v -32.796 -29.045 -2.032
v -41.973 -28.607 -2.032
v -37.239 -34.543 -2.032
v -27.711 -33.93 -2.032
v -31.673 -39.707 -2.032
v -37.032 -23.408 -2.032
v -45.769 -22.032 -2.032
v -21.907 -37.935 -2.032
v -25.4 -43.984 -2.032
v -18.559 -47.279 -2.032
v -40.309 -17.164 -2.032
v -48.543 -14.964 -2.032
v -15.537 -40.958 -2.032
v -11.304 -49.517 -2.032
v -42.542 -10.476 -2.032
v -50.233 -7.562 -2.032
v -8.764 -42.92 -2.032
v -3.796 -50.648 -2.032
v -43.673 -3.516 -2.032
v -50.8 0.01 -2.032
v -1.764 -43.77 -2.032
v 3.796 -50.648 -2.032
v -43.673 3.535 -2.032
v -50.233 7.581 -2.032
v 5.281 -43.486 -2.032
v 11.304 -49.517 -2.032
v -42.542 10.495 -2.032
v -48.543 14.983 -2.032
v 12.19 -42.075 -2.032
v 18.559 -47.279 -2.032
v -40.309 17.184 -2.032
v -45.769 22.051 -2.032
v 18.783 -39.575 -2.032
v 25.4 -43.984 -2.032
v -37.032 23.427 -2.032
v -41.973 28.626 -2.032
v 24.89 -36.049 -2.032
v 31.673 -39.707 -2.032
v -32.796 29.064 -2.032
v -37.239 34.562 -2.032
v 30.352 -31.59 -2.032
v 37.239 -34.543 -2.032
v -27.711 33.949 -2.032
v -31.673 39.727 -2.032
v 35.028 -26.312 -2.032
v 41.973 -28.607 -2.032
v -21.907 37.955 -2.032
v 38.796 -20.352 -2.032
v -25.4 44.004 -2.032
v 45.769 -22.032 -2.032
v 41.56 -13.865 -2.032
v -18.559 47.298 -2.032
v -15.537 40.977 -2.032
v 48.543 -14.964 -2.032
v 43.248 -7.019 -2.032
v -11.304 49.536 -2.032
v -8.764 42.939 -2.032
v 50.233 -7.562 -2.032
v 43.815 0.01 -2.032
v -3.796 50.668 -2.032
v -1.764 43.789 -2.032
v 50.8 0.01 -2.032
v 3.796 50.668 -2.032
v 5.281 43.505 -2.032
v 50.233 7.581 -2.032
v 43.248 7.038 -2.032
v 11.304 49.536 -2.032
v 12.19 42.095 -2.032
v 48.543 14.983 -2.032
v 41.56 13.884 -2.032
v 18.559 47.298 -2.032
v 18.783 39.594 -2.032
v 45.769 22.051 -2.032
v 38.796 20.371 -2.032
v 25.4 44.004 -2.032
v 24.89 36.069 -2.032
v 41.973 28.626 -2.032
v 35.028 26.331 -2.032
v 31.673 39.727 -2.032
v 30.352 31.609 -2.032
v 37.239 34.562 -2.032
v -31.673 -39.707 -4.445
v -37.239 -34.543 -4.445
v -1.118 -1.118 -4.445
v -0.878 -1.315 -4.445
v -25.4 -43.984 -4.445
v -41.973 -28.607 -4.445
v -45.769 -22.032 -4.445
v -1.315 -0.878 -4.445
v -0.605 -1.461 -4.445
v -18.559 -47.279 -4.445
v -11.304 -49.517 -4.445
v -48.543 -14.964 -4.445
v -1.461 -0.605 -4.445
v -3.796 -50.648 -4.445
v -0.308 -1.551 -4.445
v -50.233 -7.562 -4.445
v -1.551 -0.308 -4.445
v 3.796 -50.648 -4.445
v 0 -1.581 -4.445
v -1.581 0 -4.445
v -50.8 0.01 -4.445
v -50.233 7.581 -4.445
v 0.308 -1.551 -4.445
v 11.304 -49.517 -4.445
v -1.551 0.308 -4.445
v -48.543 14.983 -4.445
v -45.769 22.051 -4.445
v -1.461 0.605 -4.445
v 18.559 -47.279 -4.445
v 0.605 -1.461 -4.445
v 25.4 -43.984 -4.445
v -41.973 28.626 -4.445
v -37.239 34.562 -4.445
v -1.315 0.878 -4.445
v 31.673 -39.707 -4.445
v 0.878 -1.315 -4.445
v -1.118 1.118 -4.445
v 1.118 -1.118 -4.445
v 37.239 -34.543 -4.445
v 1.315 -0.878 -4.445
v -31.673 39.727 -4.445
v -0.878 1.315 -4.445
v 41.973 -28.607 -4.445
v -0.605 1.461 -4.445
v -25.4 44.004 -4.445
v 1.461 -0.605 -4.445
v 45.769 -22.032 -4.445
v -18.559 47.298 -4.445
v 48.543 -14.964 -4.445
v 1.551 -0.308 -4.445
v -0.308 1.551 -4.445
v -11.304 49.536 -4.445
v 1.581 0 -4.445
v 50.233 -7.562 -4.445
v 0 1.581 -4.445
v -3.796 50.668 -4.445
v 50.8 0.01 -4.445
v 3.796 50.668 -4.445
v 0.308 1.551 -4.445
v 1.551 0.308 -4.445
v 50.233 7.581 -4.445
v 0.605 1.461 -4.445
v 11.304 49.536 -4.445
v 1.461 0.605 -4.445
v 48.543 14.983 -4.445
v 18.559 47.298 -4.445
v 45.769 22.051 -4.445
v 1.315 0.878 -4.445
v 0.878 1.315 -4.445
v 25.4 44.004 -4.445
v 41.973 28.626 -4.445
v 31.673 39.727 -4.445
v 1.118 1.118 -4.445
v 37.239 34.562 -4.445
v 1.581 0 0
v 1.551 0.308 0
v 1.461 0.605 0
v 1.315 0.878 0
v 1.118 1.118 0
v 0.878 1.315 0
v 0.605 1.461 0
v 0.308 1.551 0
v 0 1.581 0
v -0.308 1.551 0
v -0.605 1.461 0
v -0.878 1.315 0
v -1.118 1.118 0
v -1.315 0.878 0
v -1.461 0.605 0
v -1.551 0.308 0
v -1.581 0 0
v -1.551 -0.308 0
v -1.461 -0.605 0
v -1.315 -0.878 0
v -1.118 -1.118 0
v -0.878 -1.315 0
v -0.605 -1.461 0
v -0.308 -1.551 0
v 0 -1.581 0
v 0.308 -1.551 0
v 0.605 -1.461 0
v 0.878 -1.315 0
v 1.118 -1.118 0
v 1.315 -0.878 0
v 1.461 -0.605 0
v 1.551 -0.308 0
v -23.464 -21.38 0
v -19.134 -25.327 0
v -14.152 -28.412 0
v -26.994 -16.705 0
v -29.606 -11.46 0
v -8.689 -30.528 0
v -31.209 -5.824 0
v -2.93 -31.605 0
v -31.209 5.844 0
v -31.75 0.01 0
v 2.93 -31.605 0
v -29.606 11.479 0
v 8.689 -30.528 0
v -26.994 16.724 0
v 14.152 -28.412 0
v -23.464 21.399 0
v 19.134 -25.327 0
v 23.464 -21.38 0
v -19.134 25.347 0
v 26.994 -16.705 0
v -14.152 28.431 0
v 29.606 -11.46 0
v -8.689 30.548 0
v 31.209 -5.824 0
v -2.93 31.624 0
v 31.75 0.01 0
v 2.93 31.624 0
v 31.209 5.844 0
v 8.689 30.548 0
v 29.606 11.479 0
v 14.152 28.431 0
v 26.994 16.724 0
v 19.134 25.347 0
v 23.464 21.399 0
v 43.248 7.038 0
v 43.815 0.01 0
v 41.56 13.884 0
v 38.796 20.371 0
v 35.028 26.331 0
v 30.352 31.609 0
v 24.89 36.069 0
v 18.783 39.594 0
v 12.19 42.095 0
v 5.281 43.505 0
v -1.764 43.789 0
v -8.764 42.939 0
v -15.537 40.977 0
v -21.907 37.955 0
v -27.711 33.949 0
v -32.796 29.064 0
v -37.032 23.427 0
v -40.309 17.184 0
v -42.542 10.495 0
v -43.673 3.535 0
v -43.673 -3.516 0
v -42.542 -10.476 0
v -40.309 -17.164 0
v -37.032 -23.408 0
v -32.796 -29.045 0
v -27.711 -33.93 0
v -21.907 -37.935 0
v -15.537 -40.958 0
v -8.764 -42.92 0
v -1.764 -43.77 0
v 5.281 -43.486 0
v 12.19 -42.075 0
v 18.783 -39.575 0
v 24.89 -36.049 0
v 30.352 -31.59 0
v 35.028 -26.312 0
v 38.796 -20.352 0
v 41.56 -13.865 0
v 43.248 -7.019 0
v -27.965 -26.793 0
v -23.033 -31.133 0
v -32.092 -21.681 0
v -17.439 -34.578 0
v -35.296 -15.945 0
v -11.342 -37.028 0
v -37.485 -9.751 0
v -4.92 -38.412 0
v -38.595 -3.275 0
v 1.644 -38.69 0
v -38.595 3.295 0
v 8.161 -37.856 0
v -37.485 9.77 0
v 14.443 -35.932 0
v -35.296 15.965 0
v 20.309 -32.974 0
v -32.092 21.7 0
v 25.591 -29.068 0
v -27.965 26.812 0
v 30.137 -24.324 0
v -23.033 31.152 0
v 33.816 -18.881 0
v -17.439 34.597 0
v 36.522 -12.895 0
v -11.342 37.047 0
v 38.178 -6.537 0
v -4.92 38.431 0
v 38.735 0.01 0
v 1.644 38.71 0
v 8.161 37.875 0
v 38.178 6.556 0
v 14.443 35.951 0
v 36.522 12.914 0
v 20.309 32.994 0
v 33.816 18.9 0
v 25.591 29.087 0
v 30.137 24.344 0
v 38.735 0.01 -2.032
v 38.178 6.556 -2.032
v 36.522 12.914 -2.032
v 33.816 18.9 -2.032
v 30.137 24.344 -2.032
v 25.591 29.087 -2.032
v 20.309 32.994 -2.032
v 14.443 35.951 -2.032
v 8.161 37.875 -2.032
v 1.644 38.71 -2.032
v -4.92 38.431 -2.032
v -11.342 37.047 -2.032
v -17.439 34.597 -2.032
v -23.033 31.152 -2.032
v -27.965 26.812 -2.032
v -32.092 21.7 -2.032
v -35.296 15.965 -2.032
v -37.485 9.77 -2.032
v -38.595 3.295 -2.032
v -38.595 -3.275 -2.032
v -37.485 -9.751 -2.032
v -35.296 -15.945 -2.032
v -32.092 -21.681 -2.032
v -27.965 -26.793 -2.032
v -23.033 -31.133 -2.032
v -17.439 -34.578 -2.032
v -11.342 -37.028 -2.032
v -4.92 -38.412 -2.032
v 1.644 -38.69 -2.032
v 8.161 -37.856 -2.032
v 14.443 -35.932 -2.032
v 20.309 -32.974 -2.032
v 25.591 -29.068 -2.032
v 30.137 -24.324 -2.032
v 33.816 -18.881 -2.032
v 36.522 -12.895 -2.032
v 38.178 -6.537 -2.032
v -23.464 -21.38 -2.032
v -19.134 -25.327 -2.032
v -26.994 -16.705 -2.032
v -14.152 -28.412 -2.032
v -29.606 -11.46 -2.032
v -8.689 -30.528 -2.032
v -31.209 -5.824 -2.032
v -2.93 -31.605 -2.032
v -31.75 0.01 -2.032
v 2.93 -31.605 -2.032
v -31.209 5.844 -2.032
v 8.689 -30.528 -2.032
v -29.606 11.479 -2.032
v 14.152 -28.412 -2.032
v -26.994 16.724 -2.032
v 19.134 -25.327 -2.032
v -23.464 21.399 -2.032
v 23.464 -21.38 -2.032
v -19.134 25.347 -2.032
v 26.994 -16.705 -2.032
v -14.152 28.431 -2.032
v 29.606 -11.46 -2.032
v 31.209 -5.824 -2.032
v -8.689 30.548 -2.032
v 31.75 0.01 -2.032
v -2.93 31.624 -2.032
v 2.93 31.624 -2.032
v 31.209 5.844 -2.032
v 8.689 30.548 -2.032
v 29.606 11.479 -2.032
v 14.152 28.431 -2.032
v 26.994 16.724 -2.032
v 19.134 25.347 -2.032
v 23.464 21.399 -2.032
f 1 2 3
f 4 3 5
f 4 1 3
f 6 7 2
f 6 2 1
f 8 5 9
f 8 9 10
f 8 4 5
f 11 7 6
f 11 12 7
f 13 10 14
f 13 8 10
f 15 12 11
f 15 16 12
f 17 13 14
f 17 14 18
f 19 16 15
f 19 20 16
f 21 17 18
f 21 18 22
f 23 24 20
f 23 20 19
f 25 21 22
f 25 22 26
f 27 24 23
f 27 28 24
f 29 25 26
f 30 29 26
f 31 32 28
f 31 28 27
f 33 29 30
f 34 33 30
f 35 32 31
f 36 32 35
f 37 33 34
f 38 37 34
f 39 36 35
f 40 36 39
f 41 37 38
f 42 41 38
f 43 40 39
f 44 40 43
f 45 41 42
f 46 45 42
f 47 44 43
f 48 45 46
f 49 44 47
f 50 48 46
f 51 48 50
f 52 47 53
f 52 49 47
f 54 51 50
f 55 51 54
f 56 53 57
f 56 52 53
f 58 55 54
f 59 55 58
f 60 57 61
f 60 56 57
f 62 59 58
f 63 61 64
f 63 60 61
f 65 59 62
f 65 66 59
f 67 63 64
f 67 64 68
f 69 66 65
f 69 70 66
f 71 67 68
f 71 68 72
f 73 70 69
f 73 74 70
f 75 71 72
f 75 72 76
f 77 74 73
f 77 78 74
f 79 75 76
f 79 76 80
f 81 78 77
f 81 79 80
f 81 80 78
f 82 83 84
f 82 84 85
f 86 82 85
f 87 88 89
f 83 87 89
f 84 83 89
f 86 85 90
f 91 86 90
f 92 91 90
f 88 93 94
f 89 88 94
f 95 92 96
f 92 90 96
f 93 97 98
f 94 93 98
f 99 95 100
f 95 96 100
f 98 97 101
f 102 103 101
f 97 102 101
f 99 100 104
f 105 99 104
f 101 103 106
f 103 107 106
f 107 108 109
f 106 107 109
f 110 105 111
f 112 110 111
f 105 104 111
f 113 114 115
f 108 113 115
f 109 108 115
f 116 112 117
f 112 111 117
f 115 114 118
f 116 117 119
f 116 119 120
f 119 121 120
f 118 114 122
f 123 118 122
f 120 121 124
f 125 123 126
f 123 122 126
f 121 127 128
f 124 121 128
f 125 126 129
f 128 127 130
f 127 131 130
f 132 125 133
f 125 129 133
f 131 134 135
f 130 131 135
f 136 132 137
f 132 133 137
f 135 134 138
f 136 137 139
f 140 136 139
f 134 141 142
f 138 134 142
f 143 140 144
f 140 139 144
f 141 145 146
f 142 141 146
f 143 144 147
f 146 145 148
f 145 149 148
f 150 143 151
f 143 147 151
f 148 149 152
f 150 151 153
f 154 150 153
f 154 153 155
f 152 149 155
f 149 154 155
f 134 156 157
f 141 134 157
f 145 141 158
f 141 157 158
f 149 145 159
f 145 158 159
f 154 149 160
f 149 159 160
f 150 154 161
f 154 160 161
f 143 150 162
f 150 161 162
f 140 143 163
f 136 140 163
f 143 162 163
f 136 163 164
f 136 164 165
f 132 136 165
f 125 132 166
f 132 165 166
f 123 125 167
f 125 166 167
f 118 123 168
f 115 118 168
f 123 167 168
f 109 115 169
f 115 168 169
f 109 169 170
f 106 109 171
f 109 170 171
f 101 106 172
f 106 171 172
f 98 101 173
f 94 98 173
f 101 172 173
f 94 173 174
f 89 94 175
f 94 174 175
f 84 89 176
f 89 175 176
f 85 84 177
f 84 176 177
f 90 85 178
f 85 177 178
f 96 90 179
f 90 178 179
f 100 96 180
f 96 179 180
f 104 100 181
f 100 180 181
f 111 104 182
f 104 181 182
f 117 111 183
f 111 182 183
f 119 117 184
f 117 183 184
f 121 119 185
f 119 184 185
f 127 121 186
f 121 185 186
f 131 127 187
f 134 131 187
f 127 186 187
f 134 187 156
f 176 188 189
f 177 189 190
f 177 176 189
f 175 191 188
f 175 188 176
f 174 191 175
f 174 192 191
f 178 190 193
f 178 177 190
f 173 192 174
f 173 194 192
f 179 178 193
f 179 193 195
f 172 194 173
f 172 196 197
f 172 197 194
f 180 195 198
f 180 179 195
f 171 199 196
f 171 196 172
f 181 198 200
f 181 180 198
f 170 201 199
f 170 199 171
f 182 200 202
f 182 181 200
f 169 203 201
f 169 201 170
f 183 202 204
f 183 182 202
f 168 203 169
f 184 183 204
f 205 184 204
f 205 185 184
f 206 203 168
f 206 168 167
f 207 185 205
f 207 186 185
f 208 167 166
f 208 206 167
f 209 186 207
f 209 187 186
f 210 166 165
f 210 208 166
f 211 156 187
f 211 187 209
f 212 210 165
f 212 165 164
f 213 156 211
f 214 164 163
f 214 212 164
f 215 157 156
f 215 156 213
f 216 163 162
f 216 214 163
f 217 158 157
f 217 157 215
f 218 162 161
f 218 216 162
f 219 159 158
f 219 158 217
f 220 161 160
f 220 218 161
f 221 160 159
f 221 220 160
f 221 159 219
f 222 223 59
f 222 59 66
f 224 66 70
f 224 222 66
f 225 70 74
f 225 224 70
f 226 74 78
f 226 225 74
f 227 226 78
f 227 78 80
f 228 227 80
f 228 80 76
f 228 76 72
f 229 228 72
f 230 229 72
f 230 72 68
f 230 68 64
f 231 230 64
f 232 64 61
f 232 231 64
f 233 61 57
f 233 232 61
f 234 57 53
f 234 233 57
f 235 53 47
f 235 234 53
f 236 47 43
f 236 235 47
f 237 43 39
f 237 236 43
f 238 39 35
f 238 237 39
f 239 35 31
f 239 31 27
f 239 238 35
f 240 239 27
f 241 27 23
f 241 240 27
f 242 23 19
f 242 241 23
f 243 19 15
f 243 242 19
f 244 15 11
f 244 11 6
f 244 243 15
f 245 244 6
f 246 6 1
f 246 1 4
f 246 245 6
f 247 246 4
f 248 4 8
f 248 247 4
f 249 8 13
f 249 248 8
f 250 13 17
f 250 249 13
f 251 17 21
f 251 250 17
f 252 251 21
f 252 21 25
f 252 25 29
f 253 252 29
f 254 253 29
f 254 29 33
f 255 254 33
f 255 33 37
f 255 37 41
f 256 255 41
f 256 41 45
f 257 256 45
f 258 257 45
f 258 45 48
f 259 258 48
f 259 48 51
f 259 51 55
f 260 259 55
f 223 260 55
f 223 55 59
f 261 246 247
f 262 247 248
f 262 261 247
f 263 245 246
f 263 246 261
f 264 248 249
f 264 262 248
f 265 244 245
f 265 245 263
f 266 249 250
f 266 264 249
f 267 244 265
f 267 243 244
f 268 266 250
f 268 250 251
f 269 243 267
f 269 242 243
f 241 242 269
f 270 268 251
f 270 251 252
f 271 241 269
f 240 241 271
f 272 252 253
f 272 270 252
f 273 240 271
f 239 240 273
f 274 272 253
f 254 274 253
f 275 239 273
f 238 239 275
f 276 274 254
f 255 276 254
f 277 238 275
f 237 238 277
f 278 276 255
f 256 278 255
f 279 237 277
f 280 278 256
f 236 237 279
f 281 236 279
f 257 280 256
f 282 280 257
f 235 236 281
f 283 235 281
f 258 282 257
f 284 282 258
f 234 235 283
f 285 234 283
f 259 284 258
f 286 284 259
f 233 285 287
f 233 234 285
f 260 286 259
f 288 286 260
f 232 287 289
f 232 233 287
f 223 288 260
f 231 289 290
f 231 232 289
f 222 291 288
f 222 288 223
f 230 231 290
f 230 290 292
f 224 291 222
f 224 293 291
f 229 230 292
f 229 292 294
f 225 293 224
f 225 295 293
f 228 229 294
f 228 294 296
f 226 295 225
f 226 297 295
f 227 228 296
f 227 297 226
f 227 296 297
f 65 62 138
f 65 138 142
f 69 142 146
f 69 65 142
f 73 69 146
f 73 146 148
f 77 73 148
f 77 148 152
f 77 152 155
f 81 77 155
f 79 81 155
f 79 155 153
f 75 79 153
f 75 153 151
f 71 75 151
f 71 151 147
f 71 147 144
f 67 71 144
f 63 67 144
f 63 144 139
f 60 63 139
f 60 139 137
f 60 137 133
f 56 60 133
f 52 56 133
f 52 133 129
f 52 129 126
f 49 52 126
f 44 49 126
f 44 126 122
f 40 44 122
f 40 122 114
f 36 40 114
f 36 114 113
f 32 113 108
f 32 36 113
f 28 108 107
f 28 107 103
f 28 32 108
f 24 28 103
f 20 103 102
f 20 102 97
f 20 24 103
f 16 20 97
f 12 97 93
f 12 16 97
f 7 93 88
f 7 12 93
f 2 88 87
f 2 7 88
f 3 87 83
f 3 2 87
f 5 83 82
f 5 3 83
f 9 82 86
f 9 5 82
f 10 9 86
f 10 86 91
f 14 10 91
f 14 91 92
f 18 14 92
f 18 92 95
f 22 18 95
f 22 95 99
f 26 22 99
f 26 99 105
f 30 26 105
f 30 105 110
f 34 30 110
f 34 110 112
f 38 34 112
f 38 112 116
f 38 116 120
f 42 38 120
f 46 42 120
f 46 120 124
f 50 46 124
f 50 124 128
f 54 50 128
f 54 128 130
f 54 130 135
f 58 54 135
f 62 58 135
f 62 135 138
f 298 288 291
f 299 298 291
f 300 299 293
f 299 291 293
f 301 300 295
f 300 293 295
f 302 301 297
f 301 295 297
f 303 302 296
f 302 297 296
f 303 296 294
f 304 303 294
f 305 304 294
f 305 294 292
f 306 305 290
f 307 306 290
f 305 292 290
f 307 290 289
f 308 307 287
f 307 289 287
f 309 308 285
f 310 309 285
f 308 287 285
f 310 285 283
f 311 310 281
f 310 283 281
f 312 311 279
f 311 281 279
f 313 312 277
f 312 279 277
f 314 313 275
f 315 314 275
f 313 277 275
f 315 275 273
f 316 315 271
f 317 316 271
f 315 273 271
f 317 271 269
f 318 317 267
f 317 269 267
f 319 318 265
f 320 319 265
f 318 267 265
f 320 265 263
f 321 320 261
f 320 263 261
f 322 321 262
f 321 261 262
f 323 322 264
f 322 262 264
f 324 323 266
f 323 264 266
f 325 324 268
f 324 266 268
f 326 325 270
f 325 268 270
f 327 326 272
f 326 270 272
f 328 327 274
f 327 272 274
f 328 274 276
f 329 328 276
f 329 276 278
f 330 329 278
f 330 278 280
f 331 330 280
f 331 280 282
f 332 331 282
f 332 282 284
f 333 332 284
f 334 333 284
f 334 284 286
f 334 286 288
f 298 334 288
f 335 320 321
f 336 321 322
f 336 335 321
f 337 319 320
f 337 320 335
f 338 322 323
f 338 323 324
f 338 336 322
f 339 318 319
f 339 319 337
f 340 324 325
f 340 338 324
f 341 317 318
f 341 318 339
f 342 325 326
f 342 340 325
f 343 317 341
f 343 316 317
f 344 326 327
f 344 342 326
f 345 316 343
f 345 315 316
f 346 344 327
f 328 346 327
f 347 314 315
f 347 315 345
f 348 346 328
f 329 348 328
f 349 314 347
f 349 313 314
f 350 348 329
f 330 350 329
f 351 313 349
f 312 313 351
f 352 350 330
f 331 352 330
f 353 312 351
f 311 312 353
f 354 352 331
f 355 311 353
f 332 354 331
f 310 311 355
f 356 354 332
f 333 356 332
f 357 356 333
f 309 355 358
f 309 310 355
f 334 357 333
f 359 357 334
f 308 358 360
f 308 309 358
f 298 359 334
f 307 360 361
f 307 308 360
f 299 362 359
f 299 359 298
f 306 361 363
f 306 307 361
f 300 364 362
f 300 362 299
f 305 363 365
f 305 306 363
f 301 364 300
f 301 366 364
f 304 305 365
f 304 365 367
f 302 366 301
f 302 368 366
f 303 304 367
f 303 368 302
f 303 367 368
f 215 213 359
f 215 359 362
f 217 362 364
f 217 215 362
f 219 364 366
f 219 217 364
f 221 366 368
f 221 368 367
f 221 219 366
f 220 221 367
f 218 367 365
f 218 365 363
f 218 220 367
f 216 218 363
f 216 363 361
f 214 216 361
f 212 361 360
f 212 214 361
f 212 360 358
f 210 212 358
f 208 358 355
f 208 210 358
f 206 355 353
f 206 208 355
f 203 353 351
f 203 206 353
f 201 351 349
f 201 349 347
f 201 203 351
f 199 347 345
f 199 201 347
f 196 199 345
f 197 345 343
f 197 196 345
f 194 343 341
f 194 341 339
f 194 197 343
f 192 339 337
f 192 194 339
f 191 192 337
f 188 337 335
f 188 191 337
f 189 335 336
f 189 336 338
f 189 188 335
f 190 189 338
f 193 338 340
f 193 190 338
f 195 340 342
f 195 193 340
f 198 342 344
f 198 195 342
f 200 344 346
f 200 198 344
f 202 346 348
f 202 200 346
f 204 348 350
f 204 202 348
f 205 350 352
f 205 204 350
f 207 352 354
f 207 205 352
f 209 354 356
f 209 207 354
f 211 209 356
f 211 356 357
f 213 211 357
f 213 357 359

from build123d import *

# Parameters (mm, degrees)
F0_R     = 50.8
F0_R_2   = 43.815
F0_R_3   = 38.735
F0_R_4   = 31.75
F0_R_5   = 1.581227411
F1_DEPTH = 4.445
F2_DEPTH = 2.032


with BuildPart() as f1:
    # F0 (on Top) → F1 (new body)
    with BuildSketch(Plane.XY):
        with Locations((1.2696e-06, 0.0096165841)):
            Circle(F0_R)
        with Locations((1.2696e-06, 0.0096165841)):
            Circle(F0_R_2, mode=Mode.SUBTRACT)
        with Locations((1.2696e-06, 0.0096165841)):
            Circle(F0_R_2)
        with Locations((1.2696e-06, 0.0096165841)):
            Circle(F0_R_3, mode=Mode.SUBTRACT)
        with Locations((1.2696e-06, 0.0096165841)):
            Circle(F0_R_3)
        with Locations((1.2696e-06, 0.0096165841)):
            Circle(F0_R_4, mode=Mode.SUBTRACT)
        with Locations((1.2696e-06, 0.0096165841)):
            Circle(F0_R_4)
        Circle(F0_R_5, mode=Mode.SUBTRACT)
    extrude(amount=-F1_DEPTH)

    # F0 (on Top) → F2 (cut)
    with BuildSketch(Plane.XY):
        with Locations((1.2696e-06, 0.0096165841)):
            Circle(F0_R)
        with Locations((1.2696e-06, 0.0096165841)):
            Circle(F0_R_2, mode=Mode.SUBTRACT)
        with Locations((1.2696e-06, 0.0096165841)):
            Circle(F0_R_3)
        with Locations((1.2696e-06, 0.0096165841)):
            Circle(F0_R_4, mode=Mode.SUBTRACT)
    extrude(amount=-F2_DEPTH, mode=Mode.SUBTRACT)


solid = f1.part
